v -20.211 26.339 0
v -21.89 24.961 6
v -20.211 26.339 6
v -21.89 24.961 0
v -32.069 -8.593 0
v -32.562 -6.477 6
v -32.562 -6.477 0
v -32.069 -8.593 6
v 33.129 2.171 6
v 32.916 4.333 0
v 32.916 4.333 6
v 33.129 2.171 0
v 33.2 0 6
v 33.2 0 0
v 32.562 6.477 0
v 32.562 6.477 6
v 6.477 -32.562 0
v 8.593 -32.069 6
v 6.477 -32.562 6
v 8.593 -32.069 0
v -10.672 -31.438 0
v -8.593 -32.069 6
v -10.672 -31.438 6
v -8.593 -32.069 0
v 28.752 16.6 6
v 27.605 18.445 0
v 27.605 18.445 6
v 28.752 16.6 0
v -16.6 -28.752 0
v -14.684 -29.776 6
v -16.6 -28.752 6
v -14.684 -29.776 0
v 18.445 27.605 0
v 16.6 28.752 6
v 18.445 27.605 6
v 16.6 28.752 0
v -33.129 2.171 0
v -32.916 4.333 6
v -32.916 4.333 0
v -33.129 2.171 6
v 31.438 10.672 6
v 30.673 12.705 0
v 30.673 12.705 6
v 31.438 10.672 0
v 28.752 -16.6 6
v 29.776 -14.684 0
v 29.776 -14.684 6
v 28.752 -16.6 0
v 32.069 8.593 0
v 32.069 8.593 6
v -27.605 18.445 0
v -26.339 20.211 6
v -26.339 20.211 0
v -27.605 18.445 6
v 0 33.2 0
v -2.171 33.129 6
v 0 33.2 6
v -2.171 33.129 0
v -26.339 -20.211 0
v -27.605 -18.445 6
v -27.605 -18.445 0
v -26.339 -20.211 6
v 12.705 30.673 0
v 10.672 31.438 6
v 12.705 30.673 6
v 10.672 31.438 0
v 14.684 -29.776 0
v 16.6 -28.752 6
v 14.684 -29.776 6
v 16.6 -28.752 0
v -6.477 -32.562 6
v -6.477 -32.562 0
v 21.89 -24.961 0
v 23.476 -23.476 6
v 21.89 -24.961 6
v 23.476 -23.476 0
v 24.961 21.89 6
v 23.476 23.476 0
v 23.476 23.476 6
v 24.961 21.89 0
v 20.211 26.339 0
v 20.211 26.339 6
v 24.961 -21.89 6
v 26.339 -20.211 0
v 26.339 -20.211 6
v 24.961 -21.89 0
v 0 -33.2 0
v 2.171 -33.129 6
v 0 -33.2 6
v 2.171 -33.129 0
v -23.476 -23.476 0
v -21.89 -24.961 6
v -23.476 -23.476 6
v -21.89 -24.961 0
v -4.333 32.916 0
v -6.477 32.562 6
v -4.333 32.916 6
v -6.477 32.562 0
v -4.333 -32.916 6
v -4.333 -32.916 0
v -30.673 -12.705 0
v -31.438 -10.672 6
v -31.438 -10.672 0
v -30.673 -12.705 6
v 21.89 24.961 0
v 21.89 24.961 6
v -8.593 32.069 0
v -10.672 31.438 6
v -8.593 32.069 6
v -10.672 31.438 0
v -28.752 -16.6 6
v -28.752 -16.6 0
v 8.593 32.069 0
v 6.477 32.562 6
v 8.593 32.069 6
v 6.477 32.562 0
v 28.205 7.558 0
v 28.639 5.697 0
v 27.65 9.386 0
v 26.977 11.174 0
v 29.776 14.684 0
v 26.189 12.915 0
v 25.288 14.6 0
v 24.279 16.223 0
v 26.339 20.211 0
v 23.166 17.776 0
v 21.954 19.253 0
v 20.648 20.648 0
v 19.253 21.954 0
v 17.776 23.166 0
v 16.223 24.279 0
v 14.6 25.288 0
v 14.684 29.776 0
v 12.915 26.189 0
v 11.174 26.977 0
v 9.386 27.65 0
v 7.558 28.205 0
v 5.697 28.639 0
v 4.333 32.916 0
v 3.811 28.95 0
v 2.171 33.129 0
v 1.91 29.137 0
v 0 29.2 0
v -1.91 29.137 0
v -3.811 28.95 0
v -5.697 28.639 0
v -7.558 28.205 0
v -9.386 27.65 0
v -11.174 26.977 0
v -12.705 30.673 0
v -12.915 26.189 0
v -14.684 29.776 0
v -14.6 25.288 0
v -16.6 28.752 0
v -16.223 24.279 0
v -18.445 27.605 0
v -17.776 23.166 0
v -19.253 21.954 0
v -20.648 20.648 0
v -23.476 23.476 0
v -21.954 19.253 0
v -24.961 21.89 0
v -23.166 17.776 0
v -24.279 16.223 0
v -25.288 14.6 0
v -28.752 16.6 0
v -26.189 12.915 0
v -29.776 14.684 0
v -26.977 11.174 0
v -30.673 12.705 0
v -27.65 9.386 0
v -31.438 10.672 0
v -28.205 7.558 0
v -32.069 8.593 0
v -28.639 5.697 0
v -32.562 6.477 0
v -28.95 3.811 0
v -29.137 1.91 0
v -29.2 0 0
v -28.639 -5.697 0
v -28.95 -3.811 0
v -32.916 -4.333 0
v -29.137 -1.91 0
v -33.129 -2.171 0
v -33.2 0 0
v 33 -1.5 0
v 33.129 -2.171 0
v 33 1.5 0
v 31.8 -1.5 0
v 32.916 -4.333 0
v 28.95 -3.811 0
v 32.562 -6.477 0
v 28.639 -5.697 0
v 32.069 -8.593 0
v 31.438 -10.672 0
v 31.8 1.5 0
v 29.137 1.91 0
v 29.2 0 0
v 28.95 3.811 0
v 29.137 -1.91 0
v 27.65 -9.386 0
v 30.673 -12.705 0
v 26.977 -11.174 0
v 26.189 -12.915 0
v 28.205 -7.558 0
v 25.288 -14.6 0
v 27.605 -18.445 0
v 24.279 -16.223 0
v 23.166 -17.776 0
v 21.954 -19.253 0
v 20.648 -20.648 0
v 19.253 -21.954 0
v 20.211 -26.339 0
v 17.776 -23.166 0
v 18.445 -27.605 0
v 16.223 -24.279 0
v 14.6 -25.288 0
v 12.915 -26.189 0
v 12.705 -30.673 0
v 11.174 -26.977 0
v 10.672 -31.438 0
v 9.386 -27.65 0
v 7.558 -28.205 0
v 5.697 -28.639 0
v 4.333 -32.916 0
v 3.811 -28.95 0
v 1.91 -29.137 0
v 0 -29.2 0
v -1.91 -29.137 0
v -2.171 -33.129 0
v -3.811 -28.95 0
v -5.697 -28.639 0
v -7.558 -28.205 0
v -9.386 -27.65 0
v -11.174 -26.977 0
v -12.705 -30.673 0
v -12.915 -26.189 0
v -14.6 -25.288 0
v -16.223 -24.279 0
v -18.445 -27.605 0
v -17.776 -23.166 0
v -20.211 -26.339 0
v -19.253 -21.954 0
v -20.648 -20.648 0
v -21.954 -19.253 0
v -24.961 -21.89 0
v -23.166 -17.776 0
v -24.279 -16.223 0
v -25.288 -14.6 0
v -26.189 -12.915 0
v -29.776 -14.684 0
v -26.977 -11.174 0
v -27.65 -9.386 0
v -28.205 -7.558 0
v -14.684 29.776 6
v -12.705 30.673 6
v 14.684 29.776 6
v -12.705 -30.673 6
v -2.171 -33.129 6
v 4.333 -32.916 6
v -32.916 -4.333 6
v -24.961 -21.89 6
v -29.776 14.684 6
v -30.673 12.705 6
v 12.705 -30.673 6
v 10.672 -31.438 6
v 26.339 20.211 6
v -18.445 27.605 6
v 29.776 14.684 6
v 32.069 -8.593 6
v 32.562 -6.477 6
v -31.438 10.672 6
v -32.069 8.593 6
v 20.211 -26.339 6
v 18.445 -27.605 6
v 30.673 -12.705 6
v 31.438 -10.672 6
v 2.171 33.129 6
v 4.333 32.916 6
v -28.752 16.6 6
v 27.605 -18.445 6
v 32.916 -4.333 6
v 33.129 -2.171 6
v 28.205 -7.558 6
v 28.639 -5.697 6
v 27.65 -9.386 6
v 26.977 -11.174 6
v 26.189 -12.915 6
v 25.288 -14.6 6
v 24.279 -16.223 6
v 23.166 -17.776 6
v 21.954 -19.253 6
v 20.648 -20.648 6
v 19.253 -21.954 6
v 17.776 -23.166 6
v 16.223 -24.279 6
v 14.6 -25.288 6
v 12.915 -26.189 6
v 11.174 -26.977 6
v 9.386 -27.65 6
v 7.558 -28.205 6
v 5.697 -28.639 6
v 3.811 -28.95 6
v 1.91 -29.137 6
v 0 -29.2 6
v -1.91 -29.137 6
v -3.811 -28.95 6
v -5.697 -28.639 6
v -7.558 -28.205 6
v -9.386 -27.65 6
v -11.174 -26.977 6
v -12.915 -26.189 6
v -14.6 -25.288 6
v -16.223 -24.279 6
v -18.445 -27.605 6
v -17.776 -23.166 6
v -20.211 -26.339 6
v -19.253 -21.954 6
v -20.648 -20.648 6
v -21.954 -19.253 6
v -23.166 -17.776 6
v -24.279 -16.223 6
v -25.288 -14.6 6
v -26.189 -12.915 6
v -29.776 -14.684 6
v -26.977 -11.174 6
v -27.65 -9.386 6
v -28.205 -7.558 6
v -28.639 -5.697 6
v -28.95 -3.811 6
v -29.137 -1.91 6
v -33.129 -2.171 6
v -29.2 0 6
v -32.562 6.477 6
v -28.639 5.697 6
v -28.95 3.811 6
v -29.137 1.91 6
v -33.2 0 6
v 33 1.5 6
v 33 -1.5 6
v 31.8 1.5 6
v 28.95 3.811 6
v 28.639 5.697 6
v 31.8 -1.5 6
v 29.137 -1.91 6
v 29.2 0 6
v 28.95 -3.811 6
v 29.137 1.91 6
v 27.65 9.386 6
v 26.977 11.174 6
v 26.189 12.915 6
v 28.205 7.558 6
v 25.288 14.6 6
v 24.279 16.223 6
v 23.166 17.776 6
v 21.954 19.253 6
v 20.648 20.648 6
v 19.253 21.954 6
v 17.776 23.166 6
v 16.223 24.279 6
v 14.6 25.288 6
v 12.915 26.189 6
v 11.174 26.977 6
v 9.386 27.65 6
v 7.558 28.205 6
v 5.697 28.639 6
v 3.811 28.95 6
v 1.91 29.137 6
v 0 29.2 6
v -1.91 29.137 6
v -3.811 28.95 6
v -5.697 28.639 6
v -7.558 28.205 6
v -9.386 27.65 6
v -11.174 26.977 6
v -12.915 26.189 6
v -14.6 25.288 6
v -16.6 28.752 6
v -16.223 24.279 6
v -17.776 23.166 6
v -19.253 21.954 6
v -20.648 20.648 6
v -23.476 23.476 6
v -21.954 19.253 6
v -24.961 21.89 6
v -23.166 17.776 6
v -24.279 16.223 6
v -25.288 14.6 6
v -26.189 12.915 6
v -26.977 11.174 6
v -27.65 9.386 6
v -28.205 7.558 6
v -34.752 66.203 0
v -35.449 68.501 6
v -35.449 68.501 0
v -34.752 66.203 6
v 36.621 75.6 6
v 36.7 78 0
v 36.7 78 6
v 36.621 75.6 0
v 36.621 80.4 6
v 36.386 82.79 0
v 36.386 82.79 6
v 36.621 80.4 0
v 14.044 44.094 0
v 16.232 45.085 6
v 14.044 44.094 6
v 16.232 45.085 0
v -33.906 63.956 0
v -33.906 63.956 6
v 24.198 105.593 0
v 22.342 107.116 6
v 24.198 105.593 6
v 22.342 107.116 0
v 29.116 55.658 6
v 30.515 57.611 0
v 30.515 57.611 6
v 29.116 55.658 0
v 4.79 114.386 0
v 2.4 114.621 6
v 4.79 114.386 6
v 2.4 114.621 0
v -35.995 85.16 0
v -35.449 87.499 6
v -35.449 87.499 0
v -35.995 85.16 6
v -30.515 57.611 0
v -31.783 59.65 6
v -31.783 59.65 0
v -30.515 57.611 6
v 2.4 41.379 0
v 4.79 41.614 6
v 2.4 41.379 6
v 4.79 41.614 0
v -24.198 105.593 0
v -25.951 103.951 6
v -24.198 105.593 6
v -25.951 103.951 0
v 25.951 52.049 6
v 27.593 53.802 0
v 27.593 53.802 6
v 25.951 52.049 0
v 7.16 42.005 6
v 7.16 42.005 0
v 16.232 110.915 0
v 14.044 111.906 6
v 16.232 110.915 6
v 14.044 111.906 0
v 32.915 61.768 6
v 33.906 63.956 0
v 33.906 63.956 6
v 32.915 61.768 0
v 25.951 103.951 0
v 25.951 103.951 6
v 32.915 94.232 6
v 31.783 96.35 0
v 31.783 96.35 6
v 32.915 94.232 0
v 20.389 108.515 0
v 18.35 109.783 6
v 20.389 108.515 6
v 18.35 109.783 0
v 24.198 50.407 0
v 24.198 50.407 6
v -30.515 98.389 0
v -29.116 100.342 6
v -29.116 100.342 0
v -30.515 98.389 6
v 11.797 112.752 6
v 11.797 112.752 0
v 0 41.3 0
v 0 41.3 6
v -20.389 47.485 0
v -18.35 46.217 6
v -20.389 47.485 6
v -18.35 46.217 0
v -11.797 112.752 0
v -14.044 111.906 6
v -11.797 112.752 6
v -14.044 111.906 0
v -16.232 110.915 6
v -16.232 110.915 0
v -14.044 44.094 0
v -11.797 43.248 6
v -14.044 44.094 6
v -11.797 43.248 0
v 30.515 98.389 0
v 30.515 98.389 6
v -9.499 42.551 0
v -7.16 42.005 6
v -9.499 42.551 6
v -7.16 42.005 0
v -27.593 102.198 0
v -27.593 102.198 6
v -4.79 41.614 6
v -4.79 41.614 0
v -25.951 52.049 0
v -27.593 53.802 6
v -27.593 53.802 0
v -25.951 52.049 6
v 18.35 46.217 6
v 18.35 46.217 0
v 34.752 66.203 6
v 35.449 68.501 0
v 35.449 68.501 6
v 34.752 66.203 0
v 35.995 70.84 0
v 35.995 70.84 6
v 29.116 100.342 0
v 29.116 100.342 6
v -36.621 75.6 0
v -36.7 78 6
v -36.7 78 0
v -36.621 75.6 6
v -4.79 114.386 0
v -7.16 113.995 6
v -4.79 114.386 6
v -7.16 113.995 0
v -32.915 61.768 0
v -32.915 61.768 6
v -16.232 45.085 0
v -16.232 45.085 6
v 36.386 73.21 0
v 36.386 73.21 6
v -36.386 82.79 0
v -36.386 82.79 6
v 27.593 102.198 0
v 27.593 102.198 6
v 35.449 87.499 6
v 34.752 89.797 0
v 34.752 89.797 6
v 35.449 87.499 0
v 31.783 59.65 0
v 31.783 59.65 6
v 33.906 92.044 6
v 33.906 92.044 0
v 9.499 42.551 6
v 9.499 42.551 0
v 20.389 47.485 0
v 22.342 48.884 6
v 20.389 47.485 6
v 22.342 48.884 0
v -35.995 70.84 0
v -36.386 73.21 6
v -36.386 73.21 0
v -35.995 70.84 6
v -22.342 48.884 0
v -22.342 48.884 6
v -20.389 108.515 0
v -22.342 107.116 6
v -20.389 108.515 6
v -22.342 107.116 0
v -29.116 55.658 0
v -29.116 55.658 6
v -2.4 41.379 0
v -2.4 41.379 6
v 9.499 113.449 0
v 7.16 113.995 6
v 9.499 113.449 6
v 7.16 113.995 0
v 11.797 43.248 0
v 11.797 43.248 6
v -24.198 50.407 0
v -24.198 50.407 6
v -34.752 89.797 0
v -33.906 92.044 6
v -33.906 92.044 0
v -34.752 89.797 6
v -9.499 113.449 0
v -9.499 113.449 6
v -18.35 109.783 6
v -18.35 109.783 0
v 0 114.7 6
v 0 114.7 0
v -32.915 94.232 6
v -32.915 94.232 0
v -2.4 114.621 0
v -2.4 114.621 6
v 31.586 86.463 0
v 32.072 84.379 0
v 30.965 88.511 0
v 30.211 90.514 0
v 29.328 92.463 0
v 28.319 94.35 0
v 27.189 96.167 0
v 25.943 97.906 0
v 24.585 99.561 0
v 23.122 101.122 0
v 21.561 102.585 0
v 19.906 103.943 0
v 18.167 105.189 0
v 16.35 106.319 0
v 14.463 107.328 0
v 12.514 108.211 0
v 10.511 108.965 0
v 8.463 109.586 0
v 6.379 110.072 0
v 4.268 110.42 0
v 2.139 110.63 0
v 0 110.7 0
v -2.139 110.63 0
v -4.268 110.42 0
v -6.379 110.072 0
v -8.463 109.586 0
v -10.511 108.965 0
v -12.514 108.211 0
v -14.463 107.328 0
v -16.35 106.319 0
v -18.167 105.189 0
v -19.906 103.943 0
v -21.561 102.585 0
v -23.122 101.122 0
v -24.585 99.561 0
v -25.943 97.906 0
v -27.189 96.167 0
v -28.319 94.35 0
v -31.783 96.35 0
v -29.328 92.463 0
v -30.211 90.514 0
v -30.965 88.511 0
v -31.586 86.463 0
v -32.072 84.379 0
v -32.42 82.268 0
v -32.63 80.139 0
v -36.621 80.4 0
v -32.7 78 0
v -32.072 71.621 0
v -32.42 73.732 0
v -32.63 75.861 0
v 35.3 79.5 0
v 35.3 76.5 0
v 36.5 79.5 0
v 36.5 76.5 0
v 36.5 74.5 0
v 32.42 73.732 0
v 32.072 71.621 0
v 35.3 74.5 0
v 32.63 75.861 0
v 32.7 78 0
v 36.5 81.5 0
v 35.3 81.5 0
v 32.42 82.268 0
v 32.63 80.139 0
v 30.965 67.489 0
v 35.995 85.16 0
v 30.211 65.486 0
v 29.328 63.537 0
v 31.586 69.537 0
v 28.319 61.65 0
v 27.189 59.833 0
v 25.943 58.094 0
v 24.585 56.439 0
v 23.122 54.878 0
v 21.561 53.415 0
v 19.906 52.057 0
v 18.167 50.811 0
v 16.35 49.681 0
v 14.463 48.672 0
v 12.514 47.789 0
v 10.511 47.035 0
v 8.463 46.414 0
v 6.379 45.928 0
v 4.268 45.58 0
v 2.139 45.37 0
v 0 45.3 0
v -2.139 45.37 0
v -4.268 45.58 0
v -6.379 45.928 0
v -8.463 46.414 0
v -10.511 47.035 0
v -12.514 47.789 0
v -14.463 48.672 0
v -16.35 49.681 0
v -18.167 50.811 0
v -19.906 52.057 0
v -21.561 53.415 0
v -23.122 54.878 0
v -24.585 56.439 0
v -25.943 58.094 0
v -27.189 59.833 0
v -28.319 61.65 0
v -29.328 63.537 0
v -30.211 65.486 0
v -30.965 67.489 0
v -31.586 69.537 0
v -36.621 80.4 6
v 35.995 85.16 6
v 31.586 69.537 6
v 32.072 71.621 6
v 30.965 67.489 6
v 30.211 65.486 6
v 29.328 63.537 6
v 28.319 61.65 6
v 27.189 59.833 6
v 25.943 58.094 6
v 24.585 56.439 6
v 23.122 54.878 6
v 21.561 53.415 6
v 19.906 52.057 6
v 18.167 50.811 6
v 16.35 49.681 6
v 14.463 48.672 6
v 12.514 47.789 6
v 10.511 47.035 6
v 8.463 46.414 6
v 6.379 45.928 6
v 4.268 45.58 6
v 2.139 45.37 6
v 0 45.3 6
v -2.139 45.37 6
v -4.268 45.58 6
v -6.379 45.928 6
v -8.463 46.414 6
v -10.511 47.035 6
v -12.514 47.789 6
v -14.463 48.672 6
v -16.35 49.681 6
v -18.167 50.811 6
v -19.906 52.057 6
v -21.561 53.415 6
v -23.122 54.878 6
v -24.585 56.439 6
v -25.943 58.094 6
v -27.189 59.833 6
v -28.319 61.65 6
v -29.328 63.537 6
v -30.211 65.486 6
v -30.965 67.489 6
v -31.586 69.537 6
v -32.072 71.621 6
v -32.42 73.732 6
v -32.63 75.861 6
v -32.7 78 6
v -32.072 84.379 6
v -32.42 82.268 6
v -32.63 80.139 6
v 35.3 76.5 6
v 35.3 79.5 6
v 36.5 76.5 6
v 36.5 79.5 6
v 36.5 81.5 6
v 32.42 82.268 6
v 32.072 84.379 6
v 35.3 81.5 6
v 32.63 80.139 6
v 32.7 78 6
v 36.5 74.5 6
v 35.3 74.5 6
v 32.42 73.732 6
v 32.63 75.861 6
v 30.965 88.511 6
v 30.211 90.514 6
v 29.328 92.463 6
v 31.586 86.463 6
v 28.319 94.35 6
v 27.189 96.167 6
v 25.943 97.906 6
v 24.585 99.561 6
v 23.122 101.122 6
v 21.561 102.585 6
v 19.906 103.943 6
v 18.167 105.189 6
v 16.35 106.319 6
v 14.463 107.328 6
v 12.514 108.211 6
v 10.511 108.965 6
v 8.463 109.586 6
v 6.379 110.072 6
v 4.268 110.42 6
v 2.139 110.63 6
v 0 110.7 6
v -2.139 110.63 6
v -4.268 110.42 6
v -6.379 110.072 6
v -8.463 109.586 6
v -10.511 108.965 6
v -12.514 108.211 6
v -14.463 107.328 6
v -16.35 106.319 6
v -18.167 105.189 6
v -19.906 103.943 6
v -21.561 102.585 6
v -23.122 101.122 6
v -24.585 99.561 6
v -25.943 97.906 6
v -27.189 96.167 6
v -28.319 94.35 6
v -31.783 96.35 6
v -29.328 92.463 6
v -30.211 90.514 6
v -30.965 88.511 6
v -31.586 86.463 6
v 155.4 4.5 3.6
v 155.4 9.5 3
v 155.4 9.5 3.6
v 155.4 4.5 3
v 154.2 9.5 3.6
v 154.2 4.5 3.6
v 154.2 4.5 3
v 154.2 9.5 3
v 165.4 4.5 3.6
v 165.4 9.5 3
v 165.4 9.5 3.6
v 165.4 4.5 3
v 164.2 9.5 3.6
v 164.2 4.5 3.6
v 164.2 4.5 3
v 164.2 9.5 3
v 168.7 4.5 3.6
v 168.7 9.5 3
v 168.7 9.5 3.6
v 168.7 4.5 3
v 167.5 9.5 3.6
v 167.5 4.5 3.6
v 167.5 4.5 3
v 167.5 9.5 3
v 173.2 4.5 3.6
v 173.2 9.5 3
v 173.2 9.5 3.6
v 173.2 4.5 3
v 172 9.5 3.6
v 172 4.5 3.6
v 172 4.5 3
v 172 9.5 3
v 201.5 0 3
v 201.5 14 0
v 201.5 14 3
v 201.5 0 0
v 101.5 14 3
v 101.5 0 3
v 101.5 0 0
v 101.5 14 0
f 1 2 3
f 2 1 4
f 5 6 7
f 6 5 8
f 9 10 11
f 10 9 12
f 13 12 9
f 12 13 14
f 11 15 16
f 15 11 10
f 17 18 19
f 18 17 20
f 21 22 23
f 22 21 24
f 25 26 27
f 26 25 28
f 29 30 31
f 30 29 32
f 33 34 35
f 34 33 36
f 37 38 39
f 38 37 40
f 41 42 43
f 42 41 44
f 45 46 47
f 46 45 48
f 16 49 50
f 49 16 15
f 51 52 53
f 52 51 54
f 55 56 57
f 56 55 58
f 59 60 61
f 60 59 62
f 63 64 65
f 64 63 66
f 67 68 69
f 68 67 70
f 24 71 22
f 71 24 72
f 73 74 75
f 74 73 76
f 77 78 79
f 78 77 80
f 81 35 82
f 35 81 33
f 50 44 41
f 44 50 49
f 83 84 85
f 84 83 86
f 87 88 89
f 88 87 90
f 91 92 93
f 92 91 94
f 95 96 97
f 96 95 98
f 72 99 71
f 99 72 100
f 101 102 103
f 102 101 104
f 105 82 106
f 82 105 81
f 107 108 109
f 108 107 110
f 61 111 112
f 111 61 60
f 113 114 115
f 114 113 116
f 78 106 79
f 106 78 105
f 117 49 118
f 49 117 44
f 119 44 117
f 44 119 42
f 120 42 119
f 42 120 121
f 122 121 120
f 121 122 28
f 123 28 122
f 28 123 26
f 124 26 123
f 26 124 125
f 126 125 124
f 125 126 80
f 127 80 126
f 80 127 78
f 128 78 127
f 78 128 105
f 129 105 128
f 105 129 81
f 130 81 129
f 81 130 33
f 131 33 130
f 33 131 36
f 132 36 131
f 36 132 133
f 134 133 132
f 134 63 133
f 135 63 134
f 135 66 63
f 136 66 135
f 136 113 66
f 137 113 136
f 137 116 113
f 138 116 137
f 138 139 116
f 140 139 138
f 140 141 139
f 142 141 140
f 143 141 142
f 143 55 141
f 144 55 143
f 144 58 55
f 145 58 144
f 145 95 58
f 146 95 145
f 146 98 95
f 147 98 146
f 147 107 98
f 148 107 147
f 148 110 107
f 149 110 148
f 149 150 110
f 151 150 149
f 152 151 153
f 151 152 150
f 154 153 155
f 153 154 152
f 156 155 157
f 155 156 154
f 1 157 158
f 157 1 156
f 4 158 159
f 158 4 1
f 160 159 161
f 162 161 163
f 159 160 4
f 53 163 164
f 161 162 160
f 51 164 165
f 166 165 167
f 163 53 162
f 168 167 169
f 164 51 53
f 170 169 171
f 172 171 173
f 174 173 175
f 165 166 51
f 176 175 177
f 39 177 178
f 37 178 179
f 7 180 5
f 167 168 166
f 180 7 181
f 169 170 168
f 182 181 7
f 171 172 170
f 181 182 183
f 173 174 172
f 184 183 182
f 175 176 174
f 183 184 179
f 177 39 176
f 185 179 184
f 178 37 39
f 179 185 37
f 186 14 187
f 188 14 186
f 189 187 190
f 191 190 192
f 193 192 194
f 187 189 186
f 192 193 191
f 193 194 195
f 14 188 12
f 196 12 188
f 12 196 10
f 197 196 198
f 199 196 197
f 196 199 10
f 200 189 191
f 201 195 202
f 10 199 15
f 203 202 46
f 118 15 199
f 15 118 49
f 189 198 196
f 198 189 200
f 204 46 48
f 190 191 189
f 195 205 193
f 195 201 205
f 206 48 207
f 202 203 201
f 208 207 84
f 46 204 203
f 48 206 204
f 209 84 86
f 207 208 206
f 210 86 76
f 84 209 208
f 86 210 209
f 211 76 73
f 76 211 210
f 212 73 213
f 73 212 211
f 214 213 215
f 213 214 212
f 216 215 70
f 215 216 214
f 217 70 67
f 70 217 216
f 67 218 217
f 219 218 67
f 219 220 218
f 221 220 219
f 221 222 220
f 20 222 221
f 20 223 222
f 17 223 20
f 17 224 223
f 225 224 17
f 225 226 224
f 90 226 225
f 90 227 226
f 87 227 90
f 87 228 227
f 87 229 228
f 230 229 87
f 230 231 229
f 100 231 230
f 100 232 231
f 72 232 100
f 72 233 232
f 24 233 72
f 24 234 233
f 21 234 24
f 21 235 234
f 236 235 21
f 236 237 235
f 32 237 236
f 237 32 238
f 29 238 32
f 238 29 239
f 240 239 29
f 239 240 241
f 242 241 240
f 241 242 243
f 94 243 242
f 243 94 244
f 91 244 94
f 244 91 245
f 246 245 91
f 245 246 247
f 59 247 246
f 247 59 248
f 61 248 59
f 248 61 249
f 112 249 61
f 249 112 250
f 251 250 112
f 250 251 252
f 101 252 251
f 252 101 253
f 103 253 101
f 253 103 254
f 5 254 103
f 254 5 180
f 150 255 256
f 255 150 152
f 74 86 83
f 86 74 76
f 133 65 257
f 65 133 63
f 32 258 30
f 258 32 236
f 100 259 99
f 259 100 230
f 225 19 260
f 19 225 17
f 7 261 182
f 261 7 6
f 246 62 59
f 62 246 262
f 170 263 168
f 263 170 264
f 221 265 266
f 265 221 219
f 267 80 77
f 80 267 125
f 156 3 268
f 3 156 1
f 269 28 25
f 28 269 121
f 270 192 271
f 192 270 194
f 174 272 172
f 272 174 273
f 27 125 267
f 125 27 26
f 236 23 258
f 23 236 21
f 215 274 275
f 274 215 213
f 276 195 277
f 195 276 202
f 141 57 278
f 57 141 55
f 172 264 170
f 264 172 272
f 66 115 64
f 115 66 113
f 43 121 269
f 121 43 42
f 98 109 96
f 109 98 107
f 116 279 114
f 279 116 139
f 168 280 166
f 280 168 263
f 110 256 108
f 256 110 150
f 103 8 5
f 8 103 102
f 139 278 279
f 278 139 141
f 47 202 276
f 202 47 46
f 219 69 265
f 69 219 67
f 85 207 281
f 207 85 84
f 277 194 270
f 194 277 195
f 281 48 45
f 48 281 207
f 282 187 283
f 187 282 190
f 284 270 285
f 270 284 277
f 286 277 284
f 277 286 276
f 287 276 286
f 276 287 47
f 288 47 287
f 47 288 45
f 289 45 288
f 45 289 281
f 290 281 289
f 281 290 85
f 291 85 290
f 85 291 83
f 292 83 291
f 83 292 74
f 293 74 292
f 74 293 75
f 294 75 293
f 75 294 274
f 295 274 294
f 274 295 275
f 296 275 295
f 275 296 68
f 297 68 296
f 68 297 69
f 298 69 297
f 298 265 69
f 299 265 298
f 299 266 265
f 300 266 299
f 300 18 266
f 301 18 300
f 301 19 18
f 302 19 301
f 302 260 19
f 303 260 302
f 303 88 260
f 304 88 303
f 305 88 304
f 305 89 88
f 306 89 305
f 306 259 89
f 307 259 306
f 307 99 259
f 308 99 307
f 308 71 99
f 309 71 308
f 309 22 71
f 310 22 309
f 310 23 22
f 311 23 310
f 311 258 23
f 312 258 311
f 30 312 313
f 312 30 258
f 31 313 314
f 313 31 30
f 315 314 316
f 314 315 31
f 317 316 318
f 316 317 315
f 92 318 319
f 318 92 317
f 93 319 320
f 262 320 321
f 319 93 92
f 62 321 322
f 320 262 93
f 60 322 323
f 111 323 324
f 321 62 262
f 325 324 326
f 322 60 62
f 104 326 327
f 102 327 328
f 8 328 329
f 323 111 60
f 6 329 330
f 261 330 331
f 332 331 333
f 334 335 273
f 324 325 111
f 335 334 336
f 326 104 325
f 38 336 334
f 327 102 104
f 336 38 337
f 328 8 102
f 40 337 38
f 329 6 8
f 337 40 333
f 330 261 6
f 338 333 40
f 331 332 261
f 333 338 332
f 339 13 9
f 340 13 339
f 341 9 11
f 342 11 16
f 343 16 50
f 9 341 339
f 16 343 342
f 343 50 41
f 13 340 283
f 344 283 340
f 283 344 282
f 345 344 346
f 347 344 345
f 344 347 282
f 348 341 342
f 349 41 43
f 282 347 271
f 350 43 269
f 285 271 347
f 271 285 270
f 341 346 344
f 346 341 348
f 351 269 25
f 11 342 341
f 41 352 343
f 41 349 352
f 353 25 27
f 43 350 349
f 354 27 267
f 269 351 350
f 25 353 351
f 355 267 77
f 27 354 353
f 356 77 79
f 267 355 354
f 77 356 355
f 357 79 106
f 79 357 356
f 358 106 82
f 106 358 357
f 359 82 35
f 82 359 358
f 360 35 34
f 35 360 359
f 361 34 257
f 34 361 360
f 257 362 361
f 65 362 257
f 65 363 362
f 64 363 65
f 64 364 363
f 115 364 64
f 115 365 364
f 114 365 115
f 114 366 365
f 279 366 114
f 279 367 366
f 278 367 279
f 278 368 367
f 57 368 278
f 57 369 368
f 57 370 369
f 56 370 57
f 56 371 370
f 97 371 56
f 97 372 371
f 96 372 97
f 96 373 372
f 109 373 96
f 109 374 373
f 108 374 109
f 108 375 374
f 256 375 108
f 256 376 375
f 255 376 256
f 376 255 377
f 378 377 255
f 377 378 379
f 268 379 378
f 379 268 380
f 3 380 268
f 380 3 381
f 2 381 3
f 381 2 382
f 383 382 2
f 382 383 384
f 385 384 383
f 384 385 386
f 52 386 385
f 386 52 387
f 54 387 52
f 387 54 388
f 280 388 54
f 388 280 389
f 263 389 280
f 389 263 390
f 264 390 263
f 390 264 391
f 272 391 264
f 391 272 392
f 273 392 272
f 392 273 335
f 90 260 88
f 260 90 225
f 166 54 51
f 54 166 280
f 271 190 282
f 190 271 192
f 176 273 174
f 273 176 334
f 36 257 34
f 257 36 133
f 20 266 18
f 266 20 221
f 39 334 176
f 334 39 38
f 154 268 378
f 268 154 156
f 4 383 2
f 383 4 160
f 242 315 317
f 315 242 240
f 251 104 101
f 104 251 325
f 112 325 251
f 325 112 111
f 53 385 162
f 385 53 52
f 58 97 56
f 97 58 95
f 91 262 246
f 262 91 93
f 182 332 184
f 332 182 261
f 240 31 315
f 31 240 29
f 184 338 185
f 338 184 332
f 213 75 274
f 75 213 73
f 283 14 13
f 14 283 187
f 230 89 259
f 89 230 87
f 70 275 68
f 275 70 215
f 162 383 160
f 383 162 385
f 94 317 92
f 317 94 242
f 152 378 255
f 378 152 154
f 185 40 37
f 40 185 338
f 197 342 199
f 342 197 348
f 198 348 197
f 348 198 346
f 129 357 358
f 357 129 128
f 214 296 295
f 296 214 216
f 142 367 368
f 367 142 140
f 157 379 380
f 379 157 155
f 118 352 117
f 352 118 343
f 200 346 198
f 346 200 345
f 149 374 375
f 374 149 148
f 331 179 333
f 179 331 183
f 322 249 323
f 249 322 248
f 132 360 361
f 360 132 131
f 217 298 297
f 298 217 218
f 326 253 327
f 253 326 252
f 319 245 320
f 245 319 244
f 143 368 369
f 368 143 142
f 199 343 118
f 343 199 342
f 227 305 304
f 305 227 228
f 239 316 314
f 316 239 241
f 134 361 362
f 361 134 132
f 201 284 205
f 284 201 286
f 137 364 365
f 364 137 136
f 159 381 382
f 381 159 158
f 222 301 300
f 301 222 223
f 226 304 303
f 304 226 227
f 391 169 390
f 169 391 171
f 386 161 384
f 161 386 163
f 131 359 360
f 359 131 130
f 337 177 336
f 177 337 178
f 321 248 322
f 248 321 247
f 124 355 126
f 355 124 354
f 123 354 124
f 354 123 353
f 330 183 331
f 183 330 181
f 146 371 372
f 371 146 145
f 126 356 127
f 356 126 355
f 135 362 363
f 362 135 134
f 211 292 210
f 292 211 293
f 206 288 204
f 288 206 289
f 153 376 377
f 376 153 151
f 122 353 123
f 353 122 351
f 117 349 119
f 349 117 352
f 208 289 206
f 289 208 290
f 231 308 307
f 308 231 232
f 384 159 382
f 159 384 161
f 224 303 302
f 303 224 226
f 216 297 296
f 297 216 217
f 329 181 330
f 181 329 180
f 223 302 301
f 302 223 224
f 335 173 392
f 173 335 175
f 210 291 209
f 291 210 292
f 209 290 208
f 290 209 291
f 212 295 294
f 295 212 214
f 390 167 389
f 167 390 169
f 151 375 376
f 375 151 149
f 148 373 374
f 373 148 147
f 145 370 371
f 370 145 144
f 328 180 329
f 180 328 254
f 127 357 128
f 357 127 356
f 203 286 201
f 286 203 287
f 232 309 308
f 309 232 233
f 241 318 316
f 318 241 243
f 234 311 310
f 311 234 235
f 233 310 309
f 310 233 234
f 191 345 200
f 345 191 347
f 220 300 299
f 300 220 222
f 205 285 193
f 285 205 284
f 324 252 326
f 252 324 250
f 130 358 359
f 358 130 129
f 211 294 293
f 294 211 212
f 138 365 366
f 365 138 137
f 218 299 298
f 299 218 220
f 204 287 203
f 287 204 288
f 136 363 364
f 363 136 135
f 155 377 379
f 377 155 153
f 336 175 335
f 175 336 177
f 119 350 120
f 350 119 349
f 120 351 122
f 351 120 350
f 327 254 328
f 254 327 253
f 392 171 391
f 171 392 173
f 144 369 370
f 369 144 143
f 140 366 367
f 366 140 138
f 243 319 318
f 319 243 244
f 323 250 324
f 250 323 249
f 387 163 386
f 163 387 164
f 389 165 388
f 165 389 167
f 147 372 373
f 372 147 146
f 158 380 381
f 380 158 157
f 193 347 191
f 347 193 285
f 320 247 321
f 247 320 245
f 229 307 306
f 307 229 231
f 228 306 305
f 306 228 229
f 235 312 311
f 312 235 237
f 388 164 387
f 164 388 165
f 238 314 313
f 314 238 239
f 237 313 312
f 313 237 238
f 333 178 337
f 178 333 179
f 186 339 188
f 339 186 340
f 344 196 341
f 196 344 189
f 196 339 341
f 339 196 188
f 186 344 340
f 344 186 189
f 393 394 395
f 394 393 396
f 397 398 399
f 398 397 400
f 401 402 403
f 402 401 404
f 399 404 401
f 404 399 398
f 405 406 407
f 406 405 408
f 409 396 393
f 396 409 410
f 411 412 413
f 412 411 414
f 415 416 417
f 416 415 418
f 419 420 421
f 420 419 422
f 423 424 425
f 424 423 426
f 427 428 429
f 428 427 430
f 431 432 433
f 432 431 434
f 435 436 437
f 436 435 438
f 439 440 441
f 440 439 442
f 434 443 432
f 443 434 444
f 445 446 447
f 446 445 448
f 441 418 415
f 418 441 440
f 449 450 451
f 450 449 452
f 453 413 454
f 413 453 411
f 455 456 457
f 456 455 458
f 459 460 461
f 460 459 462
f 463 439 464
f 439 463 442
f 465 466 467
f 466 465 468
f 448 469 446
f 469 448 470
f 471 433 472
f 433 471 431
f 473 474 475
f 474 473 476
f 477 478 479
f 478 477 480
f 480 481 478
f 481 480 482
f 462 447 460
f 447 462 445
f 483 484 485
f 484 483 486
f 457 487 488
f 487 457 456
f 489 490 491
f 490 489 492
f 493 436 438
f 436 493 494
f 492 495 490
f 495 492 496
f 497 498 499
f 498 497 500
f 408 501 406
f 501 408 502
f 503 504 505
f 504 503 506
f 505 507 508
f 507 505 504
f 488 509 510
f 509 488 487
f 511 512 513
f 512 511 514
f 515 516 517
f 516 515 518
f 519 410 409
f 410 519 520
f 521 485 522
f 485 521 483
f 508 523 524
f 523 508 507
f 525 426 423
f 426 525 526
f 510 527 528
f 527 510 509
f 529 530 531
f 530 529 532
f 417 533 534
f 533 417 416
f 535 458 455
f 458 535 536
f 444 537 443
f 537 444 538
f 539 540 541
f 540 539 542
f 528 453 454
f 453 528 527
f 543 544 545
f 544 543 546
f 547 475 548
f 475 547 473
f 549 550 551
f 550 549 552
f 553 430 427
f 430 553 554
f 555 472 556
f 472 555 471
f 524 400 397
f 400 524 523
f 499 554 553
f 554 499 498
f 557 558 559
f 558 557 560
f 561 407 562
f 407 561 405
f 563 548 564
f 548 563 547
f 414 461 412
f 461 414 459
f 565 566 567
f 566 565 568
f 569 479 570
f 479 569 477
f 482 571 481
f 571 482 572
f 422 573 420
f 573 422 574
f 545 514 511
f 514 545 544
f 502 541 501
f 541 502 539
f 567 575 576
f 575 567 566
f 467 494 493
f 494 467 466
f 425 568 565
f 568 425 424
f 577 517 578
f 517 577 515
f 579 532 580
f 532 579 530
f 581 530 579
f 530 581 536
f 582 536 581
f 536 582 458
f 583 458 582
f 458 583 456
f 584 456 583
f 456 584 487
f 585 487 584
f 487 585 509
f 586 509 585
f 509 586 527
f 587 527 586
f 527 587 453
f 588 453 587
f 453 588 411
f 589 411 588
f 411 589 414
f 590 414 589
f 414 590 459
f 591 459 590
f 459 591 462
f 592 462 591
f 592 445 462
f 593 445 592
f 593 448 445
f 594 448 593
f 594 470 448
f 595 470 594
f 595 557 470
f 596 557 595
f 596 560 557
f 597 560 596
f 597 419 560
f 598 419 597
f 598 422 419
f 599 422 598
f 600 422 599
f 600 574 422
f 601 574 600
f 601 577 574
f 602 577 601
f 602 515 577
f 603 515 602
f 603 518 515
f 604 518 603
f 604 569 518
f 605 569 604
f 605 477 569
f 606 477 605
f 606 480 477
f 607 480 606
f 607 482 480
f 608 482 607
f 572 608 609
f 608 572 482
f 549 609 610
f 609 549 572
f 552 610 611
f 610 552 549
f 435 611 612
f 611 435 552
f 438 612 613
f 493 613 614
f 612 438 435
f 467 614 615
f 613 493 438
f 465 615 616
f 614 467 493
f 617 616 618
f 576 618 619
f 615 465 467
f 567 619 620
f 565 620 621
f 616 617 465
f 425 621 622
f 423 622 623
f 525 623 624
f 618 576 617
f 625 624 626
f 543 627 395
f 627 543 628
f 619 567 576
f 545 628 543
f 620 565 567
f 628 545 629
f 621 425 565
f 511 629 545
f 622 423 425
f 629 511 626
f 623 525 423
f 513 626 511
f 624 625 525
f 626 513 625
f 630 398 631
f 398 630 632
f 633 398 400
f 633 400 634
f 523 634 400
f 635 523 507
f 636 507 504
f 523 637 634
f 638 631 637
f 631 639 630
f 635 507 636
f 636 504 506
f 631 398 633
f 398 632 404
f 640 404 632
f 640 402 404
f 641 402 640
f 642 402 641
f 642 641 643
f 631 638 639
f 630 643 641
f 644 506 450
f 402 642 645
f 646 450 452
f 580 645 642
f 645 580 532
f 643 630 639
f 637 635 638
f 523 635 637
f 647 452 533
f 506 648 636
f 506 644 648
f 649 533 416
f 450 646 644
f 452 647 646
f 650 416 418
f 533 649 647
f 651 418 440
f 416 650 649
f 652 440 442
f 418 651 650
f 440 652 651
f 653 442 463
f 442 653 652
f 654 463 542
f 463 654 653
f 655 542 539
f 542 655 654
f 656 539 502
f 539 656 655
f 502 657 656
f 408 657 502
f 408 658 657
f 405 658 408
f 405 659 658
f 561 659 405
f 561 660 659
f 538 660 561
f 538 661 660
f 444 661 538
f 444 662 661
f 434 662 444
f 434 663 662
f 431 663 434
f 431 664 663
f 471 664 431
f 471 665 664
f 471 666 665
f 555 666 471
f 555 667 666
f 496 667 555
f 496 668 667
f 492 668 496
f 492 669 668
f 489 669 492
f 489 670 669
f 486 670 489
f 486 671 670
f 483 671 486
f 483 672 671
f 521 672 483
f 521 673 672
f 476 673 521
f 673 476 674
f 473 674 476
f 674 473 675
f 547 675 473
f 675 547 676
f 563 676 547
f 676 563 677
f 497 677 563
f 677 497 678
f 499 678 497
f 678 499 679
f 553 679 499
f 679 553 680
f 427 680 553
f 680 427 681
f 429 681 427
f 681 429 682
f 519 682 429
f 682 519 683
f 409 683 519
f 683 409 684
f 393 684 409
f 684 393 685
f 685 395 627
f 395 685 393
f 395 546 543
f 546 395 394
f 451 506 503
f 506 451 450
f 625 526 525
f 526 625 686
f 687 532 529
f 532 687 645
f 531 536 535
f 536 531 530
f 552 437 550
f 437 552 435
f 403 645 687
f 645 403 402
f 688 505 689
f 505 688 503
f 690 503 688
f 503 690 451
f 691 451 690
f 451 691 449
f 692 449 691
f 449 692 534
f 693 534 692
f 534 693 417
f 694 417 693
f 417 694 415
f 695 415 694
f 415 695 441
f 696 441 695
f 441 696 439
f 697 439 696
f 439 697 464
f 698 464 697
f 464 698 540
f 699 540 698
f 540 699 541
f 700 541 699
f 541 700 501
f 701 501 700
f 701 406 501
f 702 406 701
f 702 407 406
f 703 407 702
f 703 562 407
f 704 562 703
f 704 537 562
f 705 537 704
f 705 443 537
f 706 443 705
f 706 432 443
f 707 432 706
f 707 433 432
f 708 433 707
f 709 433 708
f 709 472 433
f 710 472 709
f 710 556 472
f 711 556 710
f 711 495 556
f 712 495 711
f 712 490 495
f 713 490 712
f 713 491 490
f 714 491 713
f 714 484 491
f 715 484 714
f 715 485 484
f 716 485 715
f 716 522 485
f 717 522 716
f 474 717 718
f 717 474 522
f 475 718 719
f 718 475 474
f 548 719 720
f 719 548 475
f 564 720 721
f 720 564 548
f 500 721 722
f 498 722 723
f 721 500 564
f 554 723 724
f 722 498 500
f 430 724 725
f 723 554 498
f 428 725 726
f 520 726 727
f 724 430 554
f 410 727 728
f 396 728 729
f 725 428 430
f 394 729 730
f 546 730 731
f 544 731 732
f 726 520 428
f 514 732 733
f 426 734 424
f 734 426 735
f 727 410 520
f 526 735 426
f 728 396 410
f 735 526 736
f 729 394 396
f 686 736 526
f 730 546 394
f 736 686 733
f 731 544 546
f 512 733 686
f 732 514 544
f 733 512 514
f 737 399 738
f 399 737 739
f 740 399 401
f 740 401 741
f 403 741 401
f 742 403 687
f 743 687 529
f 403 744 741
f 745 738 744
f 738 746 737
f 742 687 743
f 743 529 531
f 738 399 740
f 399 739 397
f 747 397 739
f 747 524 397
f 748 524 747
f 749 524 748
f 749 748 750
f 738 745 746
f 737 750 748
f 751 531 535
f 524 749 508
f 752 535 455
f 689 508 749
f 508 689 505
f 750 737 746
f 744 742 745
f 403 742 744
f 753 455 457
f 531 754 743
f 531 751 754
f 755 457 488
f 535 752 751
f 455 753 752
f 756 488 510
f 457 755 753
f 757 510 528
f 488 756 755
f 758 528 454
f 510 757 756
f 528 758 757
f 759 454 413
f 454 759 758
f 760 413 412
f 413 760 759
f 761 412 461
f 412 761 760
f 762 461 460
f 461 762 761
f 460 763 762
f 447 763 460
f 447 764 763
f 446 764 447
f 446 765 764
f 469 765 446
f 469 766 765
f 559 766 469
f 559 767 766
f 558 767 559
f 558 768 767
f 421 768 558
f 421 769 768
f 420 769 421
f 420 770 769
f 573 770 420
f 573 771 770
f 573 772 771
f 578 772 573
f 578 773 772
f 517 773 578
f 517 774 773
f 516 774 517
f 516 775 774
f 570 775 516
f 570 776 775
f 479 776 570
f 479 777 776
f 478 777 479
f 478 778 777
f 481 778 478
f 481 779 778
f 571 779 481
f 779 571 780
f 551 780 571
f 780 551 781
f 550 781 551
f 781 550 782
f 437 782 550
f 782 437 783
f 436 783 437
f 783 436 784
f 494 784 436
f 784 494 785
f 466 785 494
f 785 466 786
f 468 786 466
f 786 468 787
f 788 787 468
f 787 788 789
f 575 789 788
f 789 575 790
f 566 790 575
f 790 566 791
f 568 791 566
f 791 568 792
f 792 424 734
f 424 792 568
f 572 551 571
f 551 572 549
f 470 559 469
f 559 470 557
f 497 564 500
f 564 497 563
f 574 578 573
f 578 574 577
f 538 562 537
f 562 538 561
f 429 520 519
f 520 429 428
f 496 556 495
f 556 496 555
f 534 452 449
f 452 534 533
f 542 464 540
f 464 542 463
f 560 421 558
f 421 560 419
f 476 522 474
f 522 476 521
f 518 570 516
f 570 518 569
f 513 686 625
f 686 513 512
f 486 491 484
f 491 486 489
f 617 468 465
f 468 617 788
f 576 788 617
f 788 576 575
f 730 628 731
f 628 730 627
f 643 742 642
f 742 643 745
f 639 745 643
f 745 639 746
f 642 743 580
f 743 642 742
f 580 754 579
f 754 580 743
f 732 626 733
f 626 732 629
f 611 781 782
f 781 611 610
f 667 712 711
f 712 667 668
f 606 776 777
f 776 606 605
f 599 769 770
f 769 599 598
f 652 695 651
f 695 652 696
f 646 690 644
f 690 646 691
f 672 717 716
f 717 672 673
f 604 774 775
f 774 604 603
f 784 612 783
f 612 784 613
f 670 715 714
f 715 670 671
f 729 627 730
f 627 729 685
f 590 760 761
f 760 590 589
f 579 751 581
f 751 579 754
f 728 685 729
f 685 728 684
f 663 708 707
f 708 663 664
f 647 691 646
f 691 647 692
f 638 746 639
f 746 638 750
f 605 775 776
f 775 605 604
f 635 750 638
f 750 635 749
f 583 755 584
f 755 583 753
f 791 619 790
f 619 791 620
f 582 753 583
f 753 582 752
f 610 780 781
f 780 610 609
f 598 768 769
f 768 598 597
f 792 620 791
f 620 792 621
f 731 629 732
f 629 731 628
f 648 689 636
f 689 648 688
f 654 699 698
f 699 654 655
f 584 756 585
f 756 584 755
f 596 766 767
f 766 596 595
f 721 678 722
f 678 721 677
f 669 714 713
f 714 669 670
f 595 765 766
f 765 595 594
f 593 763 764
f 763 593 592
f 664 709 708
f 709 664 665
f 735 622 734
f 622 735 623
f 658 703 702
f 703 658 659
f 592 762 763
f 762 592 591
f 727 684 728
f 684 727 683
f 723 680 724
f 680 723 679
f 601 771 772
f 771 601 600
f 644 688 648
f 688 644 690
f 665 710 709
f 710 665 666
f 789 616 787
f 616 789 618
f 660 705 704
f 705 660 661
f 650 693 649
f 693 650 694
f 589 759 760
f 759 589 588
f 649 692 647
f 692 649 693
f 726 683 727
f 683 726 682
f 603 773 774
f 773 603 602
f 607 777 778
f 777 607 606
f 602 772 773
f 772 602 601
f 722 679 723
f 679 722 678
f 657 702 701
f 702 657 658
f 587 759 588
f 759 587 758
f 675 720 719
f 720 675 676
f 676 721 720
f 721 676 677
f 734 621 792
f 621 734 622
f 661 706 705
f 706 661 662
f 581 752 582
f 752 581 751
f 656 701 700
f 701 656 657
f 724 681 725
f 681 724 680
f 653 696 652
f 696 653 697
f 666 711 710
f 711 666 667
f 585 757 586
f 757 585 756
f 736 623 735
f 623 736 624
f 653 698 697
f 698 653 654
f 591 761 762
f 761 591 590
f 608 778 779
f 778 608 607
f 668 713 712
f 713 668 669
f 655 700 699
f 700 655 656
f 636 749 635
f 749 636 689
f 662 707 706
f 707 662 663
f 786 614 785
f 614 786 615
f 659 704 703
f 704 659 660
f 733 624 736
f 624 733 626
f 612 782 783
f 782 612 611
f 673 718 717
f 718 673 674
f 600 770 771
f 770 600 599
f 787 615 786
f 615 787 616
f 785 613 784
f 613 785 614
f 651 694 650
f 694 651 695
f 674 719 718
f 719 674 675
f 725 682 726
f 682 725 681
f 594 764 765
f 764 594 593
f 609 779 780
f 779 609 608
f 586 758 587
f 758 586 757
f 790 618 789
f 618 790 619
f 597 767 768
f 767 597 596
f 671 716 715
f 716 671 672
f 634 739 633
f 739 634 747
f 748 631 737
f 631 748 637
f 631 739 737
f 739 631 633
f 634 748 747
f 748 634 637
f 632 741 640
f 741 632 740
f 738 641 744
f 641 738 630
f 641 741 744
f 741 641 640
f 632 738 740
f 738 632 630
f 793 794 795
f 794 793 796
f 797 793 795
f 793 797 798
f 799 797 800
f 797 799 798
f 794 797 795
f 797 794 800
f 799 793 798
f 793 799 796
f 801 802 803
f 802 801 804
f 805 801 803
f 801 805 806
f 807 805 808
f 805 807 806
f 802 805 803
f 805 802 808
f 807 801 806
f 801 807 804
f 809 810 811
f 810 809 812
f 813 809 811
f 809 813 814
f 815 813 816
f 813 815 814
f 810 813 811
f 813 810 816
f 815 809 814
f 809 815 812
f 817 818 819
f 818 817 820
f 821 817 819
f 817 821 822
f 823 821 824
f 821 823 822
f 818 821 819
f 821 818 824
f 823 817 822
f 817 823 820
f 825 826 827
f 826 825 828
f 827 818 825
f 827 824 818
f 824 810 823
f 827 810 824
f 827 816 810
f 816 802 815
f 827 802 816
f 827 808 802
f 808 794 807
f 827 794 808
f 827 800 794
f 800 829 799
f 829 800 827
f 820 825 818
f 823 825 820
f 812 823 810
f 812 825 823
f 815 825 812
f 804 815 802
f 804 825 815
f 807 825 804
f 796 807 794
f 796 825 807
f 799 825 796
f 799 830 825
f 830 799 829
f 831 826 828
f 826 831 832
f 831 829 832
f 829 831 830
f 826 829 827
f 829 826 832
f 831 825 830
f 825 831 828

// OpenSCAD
// =============================================================================
// Dock Auto-Empty Fan CANDIDATE-IDENTIFICATION gauge (Jig 19C)
// =============================================================================
// Identifies WHICH source-anchored candidate (see
// dock-auto-empty-fan/dock-auto-empty-fan.scad header, 2026-09-11 rebuild)
// a physically sourced dock fan is, BEFORE any cad modeling: drop the fan
// can through ring A (Nidec BL-V55-class OD 58) or ring B (BG26-class
// OD 65), then read its axial length against the length bar.
//
// Sources of the gauge dims (fetched & read 2026-09-11):
//   - Nidec "Blower line-up for Vacuum Cleaner Ver.16C" p.29 row V55:
//     "Size (mm) Phi58xL63.3/66.6" (side-arm 63.3 / axial-arm 66.6).
//   - BG26 product page title "2.6 inch" (= 66 mm class) + Mechanical
//     Dimensions drawing OCR: body-circle callouts 64.2/65.0 (+61.0, 67.4).
//
// Ring IDs carry a tunable clearance; length bar breaks at the candidate
// lengths so a caliper is not needed for the FIRST discrimination.
// Pass/fail + fail->fix: PRINT-TEST.md Jig 19 Part C.
// License: CC BY-SA 4.0

$fn = 96;

/* [Ring gauge] */
// drop-clearance added to the nominal OD (print-tune this only)
ring_clearance = 0.4; // [E] (estimate) typical FDM hole looseness; tune to slip-fit
ring_h      = 6;      // [E] (estimate) stiff enough not to flex while inserting
ring_wall   = 4;      // [E] (estimate)

// nominal candidate can ODs
nidec_od = 58;   // [M] Nidec deck p.29 "Phi58x..."
bg26_od  = 65;   // [M] BG26 drawing OCR circle "65.0" / title 2.6in

/* [Length bar] */
// candidate axial lengths, from the sources quoted above:
//   63.3 / 66.6 = Nidec BL-V55 side/axial arm; 71.1 = BG26 OCR axial
//   (alt. 53.3 - mapping UNRESOLVED, MEASURE-ME section 20 addendum row A3)
bar_len_marks  = [53.3, 63.3, 66.6, 71.1]; // [M] per source values above
bar_len        = 100;   // [E] (estimate) ruler span
bar_w          = 14;    // [E] (estimate)
bar_h          = 3;     // [E] (estimate)
mark_depth     = 0.8;   // [E] (estimate) embossed-line depth
mark_w         = 1.2;   // [E] (estimate)

module ring(id_mm) {
    difference() {
        cylinder(h = ring_h, r = (id_mm + 2 * ring_wall + ring_clearance) / 2);
        translate([0, 0, -0.1])
            cylinder(h = ring_h + 0.2, r = (id_mm + ring_clearance) / 2);
    }
}

// both rings side by side, engraved labels as shallow depth-letter-free
// tabs: A = one tab, B = two tabs (keep it printable without fonts)
module ring_A() { // Nidec-class, single tab
    difference() {
        ring(nidec_od);
        translate([nidec_od / 2 + ring_wall - 0.6, 0, ring_h / 2])
            cube([1.2, 3, ring_h + 0.2], center = true);
    }
}

module ring_B() { // BG26-class, double tab
    difference() {
        ring(bg26_od);
        for (dy = [-2.5, 2.5])
            translate([bg26_od / 2 + ring_wall - 0.6, dy, ring_h / 2])
                cube([1.2, 2, ring_h + 0.2], center = true);
    }
}

// length bar with embossed ridge marks ON TOP at the candidate lengths
module length_bar() {
    cube([bar_len, bar_w, bar_h]);
    for (L = bar_len_marks)
        if (L <= bar_len - mark_w)
            translate([L, bar_w / 2, bar_h + mark_depth / 2 - 0.2])
                cube([mark_w, 5, mark_depth], center = true);
}

module dock_fan_candidate_id_gauge() {
    ring_A();
    translate([0, nidec_od + 2 * ring_wall + 12, 0]) ring_B();
    translate([nidec_od / 2 + bg26_od / 2 + 40, 0, 0]) length_bar();
}

/* [Render] */
dock_fan_candidate_id_gauge();
// ring_A();  // alone
// ring_B();  // alone
// length_bar(); // alone
